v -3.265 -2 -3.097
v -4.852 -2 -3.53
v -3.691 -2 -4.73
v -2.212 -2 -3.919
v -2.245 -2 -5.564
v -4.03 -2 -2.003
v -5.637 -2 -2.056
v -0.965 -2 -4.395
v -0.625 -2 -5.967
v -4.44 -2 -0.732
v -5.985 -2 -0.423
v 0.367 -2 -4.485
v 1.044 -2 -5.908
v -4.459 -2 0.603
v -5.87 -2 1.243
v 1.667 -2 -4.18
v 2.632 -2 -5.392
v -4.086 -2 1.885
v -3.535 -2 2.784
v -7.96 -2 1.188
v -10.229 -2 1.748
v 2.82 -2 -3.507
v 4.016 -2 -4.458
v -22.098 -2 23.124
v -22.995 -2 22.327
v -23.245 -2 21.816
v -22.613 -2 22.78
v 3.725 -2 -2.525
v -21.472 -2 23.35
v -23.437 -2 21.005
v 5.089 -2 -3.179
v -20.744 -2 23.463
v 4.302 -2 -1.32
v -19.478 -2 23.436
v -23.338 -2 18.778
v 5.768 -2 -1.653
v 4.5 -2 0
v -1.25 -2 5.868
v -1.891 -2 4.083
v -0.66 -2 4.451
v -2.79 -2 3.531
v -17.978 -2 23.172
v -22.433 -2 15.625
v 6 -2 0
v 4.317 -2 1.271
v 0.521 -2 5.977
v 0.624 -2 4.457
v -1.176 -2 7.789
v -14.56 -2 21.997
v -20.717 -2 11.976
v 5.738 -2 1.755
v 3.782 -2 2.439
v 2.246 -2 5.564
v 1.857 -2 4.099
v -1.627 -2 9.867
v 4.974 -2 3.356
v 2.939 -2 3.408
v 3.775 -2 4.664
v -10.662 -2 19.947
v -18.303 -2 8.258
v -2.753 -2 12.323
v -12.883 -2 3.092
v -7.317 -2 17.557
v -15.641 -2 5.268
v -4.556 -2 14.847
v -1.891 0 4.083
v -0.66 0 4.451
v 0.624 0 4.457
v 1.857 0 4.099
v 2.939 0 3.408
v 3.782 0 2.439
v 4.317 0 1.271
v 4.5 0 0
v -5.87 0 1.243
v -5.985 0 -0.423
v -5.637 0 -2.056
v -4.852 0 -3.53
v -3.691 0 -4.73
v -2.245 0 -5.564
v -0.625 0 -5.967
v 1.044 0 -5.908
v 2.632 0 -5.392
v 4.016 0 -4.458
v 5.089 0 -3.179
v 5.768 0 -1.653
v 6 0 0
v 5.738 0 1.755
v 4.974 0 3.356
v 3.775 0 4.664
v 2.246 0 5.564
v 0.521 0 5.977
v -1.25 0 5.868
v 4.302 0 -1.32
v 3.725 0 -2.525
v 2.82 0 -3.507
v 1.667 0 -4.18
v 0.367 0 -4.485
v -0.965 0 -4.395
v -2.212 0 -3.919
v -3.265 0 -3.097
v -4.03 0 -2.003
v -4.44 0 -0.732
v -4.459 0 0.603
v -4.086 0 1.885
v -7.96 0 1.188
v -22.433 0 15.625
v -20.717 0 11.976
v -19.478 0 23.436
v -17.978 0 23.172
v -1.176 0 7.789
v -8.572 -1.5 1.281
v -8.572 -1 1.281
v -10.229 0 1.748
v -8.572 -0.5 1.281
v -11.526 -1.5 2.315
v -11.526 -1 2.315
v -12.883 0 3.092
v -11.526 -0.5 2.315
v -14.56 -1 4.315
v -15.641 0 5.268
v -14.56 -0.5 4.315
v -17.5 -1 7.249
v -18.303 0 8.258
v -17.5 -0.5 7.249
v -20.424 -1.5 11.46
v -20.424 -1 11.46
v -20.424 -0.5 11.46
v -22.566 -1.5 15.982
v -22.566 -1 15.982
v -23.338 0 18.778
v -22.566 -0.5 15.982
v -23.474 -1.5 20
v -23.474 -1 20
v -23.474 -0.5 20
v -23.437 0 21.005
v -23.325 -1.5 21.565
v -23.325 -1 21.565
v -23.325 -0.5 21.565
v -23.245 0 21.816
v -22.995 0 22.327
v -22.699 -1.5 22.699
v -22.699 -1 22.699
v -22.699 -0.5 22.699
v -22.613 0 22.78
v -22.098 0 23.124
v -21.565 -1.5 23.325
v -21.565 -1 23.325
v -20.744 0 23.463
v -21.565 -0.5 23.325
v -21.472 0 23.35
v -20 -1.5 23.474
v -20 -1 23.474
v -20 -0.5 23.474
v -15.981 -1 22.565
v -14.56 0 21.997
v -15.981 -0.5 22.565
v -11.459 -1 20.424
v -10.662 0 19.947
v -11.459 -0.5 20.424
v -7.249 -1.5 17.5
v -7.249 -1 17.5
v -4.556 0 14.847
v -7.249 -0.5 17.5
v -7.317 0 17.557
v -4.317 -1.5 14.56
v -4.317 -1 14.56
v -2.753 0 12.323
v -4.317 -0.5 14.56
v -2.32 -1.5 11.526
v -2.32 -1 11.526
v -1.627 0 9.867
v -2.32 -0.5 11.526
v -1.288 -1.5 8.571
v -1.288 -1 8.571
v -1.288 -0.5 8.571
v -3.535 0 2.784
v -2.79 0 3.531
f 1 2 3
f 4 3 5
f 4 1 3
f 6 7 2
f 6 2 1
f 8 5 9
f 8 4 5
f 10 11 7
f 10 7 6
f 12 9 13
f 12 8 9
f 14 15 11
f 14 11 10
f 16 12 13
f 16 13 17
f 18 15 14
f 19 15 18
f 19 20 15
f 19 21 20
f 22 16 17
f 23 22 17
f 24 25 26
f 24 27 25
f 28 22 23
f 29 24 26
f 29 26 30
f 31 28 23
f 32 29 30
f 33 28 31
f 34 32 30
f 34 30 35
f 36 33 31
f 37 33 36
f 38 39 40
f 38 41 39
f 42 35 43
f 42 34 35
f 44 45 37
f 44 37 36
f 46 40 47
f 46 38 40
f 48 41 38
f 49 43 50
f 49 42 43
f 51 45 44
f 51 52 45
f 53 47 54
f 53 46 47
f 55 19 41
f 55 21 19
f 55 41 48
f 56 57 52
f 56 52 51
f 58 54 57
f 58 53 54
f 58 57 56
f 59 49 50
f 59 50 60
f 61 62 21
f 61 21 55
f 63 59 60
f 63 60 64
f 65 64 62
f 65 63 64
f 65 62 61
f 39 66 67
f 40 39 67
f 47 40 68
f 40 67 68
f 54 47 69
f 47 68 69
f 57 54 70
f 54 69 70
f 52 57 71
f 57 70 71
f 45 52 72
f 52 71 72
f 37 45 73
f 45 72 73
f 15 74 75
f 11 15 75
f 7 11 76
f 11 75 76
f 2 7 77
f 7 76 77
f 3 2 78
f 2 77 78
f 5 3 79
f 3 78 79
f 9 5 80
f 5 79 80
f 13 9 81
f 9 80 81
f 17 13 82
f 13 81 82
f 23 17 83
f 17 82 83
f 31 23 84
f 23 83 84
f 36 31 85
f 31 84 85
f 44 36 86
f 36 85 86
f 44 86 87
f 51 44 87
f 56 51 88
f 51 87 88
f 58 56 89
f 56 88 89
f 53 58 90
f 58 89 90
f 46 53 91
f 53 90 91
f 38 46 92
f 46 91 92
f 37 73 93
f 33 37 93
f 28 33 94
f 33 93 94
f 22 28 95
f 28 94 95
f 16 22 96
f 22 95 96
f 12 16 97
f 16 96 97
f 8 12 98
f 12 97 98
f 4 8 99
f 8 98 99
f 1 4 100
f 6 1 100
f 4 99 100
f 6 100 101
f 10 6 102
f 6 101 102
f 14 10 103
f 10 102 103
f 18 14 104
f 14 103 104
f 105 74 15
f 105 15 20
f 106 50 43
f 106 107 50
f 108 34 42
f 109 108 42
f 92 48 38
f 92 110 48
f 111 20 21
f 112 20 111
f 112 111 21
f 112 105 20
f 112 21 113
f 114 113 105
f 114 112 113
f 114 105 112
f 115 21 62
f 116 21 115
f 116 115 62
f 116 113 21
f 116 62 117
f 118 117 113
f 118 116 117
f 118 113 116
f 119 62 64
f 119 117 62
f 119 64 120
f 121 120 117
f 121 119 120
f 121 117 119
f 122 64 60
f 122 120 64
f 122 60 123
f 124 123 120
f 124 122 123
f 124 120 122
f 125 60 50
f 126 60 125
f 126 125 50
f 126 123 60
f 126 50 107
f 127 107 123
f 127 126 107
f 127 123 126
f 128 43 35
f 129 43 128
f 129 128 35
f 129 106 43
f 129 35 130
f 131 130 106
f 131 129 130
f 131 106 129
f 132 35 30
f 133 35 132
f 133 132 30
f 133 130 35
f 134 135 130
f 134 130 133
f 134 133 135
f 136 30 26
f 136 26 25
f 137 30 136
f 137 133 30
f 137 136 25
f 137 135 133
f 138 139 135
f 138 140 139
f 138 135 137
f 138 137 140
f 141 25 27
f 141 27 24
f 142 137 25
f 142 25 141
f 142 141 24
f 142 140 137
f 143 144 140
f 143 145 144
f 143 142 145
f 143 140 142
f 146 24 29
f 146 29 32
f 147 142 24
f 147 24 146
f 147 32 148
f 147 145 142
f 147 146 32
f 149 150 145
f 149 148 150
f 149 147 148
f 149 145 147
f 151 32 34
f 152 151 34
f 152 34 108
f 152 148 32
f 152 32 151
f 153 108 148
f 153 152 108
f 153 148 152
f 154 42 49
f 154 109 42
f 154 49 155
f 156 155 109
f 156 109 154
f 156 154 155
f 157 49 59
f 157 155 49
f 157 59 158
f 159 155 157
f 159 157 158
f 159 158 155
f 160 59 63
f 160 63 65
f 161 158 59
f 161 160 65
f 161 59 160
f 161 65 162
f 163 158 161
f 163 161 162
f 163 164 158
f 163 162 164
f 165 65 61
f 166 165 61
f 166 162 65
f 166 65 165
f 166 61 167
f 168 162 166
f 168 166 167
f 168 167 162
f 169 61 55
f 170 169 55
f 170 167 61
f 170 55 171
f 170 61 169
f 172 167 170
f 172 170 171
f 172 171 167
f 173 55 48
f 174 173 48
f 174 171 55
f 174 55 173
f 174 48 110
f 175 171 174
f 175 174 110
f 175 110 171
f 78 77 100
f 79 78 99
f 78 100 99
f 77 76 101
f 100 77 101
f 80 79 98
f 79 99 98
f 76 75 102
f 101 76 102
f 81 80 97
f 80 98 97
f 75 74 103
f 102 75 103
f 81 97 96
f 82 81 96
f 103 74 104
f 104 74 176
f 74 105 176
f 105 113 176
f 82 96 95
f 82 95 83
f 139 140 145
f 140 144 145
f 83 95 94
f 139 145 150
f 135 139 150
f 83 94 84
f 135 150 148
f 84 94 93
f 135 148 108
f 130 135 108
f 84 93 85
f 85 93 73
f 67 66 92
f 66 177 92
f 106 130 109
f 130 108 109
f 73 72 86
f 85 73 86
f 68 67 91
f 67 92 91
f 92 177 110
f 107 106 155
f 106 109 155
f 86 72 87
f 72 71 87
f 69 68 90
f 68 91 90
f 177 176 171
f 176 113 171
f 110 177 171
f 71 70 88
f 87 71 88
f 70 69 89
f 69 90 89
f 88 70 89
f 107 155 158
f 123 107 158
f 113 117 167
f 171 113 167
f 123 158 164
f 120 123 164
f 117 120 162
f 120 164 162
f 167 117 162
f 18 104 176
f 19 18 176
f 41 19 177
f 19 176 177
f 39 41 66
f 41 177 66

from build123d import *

# Parameters (mm, degrees)
F1_DEPTH = 2


with BuildPart() as f1:
    # F0 (on Front) → F1 (new body)
    with BuildSketch(Plane.XZ):
        with BuildLine():
            ThreePointArc((-1.8908528339, 4.083463672), (2.4229282126, 3.7920204214), (4.5, 0))
            ThreePointArc((4.5, 0), (-0.9649113698, -4.3953323024), (-4.0861982438, 1.88493605))
            add(Edge.make_bspline(
                [(-4.0861982438, 1.88493605), (-4.6288817571, 1.5815505444), (-5.2286987053, 1.3621783459), (-5.8699100609, 1.2426406871)],
                knots=[0.9613234678, 0.9613234678, 0.9613234678, 0.9613234678, 1, 1, 1, 1], degree=3))
            ThreePointArc((-5.8699100609, 1.2426406871), (-0.6247157893, -5.9673888915), (6, 0))
            ThreePointArc((6, 0), (3.7750180605, 4.6636078997), (-1.2497462142, 5.8684013496))
            add(Edge.make_bspline(
                [(-1.2497462142, 5.8684013496), (-1.3691246524, 5.2268848968), (-1.5880681115, 4.6266370433), (-1.8908528339, 4.083463672)],
                knots=[0.8568952038, 0.8568952038, 0.8568952038, 0.8568952038, 0.8955592239, 0.8955592239, 0.8955592239, 0.8955592239], degree=3))
        make_face()
        with BuildLine():
            ThreePointArc((-4.0861982438, 1.88493605), (-3.1842841931, 3.1796751685), (-1.8908528339, 4.083463672))
            add(Edge.make_bspline(
                [(-1.2497462142, 5.8684013496), (-1.3691246524, 5.2268848968), (-1.5880681115, 4.6266370433), (-1.8908528339, 4.083463672)],
                knots=[0.8568952038, 0.8568952038, 0.8568952038, 0.8568952038, 0.8955592239, 0.8955592239, 0.8955592239, 0.8955592239], degree=3))
            ThreePointArc((-1.2497462142, 5.8684013496), (-4.245208098, 4.2400717216), (-5.8699100609, 1.2426406871))
            add(Edge.make_bspline(
                [(-4.0861982438, 1.88493605), (-4.6288817571, 1.5815505444), (-5.2286987053, 1.3621783459), (-5.8699100609, 1.2426406871)],
                knots=[0.9613234678, 0.9613234678, 0.9613234678, 0.9613234678, 1, 1, 1, 1], degree=3))
        make_face()
        with BuildLine():
            ThreePointArc((-5.8699100609, 1.2426406871), (-4.245208098, 4.2400717216), (-1.2497462142, 5.8684013496))
            add(Edge.make_bspline(
                [(-5.8699100609, 1.2426406871), (-9.2268988882, 0.6168149256), (-18.7309347957, 5.082703276), (-28.3915813767, 28.3905215152), (-5.079350829, 18.7312919984), (-0.6245975873, 9.2278281905), (-1.2497462142, 5.8684013496)],
                knots=[0, 0, 0, 0, 0.2024865673, 0.4284550198, 0.6544234723, 0.8568952038, 0.8568952038, 0.8568952038, 0.8568952038], degree=3))
        make_face()
    extrude(amount=F1_DEPTH)


solid = f1.part
